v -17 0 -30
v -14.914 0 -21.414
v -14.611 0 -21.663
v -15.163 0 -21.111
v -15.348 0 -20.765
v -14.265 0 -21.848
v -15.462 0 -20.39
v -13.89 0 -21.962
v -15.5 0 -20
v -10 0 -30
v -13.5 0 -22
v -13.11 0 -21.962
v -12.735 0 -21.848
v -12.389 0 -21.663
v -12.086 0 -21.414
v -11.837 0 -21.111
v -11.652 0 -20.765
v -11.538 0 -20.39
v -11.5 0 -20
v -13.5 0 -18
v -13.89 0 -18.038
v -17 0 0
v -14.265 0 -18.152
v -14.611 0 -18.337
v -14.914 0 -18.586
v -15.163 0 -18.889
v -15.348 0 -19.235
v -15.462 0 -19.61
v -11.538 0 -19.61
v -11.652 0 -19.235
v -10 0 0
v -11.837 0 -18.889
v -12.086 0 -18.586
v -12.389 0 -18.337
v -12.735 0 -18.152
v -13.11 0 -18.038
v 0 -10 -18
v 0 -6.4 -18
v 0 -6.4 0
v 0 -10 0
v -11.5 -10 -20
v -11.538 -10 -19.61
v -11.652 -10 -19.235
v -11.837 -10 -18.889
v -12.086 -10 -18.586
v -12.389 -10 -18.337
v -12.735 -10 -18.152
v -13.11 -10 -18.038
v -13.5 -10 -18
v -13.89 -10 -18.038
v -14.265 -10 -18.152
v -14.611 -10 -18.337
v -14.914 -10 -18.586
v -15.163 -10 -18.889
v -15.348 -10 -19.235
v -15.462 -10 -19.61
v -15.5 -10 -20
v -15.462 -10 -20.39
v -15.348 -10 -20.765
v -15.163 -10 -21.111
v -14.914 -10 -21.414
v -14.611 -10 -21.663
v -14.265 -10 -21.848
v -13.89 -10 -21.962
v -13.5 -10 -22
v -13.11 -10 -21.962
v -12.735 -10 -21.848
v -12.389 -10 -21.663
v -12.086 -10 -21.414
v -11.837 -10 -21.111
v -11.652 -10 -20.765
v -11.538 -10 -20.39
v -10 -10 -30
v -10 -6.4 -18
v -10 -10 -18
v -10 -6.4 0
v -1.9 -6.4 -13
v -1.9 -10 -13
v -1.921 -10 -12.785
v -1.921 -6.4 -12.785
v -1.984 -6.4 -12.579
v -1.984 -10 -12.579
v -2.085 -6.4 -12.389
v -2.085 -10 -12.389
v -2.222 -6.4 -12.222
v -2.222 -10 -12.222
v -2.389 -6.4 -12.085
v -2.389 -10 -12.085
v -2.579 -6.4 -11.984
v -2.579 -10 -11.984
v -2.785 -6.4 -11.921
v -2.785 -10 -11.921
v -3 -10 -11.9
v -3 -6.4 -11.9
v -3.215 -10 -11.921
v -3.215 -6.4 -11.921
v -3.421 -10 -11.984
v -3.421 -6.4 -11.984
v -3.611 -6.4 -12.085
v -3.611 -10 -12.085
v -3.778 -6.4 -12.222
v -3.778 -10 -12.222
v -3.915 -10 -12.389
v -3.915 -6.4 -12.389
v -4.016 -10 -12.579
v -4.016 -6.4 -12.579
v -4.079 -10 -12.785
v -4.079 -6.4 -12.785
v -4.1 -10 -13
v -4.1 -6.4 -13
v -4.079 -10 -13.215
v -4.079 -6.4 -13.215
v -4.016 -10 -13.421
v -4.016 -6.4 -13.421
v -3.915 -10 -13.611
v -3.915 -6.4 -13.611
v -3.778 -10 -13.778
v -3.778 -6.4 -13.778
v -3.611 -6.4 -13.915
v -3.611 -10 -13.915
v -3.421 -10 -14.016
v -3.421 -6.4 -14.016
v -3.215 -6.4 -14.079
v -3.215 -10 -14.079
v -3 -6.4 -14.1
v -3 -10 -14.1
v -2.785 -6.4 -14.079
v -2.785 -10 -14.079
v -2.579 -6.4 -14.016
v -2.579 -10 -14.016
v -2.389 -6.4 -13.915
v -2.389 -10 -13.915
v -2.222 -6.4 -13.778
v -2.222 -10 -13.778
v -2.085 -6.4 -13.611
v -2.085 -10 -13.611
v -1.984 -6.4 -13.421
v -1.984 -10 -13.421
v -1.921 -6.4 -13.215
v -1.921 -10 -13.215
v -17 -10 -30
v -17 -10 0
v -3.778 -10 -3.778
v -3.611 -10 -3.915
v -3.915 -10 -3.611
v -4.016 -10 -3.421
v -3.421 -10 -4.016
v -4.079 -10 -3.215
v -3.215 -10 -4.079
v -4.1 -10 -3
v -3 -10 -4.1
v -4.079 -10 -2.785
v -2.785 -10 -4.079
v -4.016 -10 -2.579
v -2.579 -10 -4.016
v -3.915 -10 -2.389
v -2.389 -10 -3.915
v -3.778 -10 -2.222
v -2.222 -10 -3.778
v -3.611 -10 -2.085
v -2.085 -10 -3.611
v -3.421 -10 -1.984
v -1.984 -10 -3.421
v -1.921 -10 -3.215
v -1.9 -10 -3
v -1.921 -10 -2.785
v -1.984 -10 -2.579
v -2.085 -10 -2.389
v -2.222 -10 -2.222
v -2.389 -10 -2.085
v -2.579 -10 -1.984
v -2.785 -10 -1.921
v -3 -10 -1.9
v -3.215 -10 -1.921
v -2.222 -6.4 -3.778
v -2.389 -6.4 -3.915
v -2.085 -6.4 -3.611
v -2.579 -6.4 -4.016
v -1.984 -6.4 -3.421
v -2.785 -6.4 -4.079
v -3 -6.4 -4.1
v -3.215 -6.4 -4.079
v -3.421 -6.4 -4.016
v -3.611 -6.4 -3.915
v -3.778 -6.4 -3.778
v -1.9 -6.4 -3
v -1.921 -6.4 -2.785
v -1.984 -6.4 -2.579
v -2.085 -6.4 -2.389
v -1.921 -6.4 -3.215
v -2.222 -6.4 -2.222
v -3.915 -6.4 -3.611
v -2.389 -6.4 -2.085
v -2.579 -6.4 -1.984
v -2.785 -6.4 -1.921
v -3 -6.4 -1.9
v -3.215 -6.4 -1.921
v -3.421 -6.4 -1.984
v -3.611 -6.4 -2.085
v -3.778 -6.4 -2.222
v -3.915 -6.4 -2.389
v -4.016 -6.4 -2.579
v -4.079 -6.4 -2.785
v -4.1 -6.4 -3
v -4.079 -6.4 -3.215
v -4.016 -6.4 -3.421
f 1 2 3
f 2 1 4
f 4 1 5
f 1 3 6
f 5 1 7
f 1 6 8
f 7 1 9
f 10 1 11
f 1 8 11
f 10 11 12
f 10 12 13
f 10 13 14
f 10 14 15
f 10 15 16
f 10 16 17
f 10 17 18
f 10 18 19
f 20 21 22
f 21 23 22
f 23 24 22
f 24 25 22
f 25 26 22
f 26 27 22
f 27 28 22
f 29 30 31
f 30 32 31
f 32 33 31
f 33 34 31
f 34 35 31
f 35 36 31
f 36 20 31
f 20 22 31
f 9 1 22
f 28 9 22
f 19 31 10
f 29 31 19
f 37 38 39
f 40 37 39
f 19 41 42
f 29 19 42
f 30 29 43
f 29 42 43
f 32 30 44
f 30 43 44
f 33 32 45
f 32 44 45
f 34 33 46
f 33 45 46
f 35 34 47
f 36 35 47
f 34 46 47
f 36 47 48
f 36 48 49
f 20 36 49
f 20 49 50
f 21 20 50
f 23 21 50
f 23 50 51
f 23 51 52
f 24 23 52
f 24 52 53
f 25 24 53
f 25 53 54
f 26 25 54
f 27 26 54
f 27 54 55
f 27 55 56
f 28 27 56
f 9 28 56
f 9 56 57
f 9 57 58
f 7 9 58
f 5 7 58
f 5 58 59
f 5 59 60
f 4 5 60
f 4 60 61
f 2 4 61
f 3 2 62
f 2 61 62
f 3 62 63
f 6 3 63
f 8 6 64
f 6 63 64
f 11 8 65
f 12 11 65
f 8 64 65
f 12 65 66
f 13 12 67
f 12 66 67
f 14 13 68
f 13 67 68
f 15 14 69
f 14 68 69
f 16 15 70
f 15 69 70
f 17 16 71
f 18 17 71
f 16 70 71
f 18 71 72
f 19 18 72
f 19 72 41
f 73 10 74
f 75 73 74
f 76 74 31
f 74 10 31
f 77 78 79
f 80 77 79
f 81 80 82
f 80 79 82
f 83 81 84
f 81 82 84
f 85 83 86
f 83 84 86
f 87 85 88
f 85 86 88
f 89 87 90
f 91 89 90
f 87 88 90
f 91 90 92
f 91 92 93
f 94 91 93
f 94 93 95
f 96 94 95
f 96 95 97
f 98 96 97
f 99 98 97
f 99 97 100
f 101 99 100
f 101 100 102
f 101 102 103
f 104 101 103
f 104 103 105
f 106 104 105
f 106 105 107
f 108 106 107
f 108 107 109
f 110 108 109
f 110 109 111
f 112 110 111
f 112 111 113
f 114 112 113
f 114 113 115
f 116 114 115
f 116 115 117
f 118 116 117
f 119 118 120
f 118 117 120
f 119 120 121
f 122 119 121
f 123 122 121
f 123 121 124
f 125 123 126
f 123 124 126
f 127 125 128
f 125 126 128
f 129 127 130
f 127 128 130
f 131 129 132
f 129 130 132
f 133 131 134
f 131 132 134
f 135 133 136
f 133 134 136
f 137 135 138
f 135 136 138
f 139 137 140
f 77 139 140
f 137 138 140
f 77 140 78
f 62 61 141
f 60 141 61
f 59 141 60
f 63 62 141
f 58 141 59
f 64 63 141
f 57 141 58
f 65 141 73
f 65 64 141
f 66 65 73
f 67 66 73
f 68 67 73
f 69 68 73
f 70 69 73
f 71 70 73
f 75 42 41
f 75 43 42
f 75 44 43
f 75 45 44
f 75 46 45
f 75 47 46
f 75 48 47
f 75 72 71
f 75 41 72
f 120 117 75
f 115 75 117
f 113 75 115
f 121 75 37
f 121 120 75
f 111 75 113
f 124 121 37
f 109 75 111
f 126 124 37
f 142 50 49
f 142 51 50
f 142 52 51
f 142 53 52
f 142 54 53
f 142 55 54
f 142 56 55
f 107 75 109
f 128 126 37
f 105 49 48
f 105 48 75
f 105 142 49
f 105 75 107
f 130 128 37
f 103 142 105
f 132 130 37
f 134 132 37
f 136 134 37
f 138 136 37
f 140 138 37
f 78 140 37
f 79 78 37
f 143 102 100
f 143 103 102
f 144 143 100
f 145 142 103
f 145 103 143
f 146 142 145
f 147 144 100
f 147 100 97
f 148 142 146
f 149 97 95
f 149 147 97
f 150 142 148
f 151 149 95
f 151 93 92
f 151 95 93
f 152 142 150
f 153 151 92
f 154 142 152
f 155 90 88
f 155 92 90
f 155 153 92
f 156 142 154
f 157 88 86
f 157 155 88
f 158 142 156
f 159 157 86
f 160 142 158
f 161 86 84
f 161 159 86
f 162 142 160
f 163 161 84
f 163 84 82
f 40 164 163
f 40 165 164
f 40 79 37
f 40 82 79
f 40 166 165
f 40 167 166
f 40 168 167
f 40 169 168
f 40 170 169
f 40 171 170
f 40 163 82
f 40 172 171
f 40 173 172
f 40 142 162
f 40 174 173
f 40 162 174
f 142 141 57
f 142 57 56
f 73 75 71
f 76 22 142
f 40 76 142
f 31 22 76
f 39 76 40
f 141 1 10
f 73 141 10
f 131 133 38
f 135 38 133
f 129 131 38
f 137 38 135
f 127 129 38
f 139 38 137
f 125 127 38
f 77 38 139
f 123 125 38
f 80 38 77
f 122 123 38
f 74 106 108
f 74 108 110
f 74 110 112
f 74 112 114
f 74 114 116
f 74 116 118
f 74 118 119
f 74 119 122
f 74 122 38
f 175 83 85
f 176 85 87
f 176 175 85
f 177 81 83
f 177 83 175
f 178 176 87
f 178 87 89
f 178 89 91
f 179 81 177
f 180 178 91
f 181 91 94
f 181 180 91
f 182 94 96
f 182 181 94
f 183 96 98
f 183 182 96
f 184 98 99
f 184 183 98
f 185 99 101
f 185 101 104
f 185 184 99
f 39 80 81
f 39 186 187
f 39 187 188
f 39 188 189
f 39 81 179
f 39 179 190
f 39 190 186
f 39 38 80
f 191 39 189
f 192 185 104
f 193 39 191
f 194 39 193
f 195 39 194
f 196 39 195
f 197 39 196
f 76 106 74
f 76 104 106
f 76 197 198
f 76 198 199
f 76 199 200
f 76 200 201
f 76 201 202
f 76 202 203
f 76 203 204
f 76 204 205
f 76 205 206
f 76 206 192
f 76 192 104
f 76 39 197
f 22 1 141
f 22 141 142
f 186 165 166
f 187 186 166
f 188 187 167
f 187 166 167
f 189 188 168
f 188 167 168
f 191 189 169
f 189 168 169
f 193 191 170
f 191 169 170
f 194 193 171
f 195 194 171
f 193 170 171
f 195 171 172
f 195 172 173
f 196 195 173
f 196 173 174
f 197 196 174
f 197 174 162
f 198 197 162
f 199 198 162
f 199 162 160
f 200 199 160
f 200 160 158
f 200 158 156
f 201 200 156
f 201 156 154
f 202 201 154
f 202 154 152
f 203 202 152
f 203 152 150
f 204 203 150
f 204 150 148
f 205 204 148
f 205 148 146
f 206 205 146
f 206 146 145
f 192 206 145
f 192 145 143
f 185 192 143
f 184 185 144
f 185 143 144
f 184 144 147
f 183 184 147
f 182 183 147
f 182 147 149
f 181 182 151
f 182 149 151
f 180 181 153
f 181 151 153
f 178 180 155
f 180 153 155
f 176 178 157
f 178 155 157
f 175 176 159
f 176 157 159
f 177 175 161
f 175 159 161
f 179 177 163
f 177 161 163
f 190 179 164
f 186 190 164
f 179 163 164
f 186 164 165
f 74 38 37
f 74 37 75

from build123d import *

# Parameters (mm, degrees)
F0_W     = 17
F0_H     = 30
F1_DEPTH = 10
F2_W     = 10
F2_H     = 30
F3_DEPTH = 6.4
F4_R     = 2
F5_DEPTH = 25
F6_R     = 1.1
F7_DEPTH = 25
F8_W     = 10
F8_H     = 12
F9_DEPTH = 25


with BuildPart() as f1:
    # F0 (on Front) → F1 (new body)
    with BuildSketch(Plane.XZ):
        with Locations((-8.5, -15)):
            Rectangle(F0_W, F0_H)
    extrude(amount=F1_DEPTH)

    # F2 (on face) → F3 (cut)
    with BuildSketch(Plane(origin=(0, 0, 0), x_dir=(-1, 0, 0), z_dir=(0, 1, 0))):
        with Locations((5, -15)):
            Rectangle(F2_W, F2_H)
    extrude(amount=-F3_DEPTH, mode=Mode.SUBTRACT)

    # F4 (on face) → F5 (cut)
    with BuildSketch(Plane.XZ.offset(10)):
        with Locations((-13.5, -20)):
            Circle(F4_R)
    extrude(amount=-F5_DEPTH, mode=Mode.SUBTRACT)

    # F6 (on face) → F7 (cut)
    with BuildSketch(Plane.XZ.offset(10)):
        with Locations((-3, -3)):
            Circle(F6_R)
        with Locations((-3, -13)):
            Circle(F6_R)
    extrude(amount=-F7_DEPTH, mode=Mode.SUBTRACT)

    # F8 (on face) → F9 (cut)
    with BuildSketch(Plane(origin=(0, -6.4, 0), x_dir=(-1, 0, 0), z_dir=(0, 1, 0))):
        with Locations((5, -24)):
            Rectangle(F8_W, F8_H)
    extrude(amount=-F9_DEPTH, mode=Mode.SUBTRACT)


solid = f1.part
